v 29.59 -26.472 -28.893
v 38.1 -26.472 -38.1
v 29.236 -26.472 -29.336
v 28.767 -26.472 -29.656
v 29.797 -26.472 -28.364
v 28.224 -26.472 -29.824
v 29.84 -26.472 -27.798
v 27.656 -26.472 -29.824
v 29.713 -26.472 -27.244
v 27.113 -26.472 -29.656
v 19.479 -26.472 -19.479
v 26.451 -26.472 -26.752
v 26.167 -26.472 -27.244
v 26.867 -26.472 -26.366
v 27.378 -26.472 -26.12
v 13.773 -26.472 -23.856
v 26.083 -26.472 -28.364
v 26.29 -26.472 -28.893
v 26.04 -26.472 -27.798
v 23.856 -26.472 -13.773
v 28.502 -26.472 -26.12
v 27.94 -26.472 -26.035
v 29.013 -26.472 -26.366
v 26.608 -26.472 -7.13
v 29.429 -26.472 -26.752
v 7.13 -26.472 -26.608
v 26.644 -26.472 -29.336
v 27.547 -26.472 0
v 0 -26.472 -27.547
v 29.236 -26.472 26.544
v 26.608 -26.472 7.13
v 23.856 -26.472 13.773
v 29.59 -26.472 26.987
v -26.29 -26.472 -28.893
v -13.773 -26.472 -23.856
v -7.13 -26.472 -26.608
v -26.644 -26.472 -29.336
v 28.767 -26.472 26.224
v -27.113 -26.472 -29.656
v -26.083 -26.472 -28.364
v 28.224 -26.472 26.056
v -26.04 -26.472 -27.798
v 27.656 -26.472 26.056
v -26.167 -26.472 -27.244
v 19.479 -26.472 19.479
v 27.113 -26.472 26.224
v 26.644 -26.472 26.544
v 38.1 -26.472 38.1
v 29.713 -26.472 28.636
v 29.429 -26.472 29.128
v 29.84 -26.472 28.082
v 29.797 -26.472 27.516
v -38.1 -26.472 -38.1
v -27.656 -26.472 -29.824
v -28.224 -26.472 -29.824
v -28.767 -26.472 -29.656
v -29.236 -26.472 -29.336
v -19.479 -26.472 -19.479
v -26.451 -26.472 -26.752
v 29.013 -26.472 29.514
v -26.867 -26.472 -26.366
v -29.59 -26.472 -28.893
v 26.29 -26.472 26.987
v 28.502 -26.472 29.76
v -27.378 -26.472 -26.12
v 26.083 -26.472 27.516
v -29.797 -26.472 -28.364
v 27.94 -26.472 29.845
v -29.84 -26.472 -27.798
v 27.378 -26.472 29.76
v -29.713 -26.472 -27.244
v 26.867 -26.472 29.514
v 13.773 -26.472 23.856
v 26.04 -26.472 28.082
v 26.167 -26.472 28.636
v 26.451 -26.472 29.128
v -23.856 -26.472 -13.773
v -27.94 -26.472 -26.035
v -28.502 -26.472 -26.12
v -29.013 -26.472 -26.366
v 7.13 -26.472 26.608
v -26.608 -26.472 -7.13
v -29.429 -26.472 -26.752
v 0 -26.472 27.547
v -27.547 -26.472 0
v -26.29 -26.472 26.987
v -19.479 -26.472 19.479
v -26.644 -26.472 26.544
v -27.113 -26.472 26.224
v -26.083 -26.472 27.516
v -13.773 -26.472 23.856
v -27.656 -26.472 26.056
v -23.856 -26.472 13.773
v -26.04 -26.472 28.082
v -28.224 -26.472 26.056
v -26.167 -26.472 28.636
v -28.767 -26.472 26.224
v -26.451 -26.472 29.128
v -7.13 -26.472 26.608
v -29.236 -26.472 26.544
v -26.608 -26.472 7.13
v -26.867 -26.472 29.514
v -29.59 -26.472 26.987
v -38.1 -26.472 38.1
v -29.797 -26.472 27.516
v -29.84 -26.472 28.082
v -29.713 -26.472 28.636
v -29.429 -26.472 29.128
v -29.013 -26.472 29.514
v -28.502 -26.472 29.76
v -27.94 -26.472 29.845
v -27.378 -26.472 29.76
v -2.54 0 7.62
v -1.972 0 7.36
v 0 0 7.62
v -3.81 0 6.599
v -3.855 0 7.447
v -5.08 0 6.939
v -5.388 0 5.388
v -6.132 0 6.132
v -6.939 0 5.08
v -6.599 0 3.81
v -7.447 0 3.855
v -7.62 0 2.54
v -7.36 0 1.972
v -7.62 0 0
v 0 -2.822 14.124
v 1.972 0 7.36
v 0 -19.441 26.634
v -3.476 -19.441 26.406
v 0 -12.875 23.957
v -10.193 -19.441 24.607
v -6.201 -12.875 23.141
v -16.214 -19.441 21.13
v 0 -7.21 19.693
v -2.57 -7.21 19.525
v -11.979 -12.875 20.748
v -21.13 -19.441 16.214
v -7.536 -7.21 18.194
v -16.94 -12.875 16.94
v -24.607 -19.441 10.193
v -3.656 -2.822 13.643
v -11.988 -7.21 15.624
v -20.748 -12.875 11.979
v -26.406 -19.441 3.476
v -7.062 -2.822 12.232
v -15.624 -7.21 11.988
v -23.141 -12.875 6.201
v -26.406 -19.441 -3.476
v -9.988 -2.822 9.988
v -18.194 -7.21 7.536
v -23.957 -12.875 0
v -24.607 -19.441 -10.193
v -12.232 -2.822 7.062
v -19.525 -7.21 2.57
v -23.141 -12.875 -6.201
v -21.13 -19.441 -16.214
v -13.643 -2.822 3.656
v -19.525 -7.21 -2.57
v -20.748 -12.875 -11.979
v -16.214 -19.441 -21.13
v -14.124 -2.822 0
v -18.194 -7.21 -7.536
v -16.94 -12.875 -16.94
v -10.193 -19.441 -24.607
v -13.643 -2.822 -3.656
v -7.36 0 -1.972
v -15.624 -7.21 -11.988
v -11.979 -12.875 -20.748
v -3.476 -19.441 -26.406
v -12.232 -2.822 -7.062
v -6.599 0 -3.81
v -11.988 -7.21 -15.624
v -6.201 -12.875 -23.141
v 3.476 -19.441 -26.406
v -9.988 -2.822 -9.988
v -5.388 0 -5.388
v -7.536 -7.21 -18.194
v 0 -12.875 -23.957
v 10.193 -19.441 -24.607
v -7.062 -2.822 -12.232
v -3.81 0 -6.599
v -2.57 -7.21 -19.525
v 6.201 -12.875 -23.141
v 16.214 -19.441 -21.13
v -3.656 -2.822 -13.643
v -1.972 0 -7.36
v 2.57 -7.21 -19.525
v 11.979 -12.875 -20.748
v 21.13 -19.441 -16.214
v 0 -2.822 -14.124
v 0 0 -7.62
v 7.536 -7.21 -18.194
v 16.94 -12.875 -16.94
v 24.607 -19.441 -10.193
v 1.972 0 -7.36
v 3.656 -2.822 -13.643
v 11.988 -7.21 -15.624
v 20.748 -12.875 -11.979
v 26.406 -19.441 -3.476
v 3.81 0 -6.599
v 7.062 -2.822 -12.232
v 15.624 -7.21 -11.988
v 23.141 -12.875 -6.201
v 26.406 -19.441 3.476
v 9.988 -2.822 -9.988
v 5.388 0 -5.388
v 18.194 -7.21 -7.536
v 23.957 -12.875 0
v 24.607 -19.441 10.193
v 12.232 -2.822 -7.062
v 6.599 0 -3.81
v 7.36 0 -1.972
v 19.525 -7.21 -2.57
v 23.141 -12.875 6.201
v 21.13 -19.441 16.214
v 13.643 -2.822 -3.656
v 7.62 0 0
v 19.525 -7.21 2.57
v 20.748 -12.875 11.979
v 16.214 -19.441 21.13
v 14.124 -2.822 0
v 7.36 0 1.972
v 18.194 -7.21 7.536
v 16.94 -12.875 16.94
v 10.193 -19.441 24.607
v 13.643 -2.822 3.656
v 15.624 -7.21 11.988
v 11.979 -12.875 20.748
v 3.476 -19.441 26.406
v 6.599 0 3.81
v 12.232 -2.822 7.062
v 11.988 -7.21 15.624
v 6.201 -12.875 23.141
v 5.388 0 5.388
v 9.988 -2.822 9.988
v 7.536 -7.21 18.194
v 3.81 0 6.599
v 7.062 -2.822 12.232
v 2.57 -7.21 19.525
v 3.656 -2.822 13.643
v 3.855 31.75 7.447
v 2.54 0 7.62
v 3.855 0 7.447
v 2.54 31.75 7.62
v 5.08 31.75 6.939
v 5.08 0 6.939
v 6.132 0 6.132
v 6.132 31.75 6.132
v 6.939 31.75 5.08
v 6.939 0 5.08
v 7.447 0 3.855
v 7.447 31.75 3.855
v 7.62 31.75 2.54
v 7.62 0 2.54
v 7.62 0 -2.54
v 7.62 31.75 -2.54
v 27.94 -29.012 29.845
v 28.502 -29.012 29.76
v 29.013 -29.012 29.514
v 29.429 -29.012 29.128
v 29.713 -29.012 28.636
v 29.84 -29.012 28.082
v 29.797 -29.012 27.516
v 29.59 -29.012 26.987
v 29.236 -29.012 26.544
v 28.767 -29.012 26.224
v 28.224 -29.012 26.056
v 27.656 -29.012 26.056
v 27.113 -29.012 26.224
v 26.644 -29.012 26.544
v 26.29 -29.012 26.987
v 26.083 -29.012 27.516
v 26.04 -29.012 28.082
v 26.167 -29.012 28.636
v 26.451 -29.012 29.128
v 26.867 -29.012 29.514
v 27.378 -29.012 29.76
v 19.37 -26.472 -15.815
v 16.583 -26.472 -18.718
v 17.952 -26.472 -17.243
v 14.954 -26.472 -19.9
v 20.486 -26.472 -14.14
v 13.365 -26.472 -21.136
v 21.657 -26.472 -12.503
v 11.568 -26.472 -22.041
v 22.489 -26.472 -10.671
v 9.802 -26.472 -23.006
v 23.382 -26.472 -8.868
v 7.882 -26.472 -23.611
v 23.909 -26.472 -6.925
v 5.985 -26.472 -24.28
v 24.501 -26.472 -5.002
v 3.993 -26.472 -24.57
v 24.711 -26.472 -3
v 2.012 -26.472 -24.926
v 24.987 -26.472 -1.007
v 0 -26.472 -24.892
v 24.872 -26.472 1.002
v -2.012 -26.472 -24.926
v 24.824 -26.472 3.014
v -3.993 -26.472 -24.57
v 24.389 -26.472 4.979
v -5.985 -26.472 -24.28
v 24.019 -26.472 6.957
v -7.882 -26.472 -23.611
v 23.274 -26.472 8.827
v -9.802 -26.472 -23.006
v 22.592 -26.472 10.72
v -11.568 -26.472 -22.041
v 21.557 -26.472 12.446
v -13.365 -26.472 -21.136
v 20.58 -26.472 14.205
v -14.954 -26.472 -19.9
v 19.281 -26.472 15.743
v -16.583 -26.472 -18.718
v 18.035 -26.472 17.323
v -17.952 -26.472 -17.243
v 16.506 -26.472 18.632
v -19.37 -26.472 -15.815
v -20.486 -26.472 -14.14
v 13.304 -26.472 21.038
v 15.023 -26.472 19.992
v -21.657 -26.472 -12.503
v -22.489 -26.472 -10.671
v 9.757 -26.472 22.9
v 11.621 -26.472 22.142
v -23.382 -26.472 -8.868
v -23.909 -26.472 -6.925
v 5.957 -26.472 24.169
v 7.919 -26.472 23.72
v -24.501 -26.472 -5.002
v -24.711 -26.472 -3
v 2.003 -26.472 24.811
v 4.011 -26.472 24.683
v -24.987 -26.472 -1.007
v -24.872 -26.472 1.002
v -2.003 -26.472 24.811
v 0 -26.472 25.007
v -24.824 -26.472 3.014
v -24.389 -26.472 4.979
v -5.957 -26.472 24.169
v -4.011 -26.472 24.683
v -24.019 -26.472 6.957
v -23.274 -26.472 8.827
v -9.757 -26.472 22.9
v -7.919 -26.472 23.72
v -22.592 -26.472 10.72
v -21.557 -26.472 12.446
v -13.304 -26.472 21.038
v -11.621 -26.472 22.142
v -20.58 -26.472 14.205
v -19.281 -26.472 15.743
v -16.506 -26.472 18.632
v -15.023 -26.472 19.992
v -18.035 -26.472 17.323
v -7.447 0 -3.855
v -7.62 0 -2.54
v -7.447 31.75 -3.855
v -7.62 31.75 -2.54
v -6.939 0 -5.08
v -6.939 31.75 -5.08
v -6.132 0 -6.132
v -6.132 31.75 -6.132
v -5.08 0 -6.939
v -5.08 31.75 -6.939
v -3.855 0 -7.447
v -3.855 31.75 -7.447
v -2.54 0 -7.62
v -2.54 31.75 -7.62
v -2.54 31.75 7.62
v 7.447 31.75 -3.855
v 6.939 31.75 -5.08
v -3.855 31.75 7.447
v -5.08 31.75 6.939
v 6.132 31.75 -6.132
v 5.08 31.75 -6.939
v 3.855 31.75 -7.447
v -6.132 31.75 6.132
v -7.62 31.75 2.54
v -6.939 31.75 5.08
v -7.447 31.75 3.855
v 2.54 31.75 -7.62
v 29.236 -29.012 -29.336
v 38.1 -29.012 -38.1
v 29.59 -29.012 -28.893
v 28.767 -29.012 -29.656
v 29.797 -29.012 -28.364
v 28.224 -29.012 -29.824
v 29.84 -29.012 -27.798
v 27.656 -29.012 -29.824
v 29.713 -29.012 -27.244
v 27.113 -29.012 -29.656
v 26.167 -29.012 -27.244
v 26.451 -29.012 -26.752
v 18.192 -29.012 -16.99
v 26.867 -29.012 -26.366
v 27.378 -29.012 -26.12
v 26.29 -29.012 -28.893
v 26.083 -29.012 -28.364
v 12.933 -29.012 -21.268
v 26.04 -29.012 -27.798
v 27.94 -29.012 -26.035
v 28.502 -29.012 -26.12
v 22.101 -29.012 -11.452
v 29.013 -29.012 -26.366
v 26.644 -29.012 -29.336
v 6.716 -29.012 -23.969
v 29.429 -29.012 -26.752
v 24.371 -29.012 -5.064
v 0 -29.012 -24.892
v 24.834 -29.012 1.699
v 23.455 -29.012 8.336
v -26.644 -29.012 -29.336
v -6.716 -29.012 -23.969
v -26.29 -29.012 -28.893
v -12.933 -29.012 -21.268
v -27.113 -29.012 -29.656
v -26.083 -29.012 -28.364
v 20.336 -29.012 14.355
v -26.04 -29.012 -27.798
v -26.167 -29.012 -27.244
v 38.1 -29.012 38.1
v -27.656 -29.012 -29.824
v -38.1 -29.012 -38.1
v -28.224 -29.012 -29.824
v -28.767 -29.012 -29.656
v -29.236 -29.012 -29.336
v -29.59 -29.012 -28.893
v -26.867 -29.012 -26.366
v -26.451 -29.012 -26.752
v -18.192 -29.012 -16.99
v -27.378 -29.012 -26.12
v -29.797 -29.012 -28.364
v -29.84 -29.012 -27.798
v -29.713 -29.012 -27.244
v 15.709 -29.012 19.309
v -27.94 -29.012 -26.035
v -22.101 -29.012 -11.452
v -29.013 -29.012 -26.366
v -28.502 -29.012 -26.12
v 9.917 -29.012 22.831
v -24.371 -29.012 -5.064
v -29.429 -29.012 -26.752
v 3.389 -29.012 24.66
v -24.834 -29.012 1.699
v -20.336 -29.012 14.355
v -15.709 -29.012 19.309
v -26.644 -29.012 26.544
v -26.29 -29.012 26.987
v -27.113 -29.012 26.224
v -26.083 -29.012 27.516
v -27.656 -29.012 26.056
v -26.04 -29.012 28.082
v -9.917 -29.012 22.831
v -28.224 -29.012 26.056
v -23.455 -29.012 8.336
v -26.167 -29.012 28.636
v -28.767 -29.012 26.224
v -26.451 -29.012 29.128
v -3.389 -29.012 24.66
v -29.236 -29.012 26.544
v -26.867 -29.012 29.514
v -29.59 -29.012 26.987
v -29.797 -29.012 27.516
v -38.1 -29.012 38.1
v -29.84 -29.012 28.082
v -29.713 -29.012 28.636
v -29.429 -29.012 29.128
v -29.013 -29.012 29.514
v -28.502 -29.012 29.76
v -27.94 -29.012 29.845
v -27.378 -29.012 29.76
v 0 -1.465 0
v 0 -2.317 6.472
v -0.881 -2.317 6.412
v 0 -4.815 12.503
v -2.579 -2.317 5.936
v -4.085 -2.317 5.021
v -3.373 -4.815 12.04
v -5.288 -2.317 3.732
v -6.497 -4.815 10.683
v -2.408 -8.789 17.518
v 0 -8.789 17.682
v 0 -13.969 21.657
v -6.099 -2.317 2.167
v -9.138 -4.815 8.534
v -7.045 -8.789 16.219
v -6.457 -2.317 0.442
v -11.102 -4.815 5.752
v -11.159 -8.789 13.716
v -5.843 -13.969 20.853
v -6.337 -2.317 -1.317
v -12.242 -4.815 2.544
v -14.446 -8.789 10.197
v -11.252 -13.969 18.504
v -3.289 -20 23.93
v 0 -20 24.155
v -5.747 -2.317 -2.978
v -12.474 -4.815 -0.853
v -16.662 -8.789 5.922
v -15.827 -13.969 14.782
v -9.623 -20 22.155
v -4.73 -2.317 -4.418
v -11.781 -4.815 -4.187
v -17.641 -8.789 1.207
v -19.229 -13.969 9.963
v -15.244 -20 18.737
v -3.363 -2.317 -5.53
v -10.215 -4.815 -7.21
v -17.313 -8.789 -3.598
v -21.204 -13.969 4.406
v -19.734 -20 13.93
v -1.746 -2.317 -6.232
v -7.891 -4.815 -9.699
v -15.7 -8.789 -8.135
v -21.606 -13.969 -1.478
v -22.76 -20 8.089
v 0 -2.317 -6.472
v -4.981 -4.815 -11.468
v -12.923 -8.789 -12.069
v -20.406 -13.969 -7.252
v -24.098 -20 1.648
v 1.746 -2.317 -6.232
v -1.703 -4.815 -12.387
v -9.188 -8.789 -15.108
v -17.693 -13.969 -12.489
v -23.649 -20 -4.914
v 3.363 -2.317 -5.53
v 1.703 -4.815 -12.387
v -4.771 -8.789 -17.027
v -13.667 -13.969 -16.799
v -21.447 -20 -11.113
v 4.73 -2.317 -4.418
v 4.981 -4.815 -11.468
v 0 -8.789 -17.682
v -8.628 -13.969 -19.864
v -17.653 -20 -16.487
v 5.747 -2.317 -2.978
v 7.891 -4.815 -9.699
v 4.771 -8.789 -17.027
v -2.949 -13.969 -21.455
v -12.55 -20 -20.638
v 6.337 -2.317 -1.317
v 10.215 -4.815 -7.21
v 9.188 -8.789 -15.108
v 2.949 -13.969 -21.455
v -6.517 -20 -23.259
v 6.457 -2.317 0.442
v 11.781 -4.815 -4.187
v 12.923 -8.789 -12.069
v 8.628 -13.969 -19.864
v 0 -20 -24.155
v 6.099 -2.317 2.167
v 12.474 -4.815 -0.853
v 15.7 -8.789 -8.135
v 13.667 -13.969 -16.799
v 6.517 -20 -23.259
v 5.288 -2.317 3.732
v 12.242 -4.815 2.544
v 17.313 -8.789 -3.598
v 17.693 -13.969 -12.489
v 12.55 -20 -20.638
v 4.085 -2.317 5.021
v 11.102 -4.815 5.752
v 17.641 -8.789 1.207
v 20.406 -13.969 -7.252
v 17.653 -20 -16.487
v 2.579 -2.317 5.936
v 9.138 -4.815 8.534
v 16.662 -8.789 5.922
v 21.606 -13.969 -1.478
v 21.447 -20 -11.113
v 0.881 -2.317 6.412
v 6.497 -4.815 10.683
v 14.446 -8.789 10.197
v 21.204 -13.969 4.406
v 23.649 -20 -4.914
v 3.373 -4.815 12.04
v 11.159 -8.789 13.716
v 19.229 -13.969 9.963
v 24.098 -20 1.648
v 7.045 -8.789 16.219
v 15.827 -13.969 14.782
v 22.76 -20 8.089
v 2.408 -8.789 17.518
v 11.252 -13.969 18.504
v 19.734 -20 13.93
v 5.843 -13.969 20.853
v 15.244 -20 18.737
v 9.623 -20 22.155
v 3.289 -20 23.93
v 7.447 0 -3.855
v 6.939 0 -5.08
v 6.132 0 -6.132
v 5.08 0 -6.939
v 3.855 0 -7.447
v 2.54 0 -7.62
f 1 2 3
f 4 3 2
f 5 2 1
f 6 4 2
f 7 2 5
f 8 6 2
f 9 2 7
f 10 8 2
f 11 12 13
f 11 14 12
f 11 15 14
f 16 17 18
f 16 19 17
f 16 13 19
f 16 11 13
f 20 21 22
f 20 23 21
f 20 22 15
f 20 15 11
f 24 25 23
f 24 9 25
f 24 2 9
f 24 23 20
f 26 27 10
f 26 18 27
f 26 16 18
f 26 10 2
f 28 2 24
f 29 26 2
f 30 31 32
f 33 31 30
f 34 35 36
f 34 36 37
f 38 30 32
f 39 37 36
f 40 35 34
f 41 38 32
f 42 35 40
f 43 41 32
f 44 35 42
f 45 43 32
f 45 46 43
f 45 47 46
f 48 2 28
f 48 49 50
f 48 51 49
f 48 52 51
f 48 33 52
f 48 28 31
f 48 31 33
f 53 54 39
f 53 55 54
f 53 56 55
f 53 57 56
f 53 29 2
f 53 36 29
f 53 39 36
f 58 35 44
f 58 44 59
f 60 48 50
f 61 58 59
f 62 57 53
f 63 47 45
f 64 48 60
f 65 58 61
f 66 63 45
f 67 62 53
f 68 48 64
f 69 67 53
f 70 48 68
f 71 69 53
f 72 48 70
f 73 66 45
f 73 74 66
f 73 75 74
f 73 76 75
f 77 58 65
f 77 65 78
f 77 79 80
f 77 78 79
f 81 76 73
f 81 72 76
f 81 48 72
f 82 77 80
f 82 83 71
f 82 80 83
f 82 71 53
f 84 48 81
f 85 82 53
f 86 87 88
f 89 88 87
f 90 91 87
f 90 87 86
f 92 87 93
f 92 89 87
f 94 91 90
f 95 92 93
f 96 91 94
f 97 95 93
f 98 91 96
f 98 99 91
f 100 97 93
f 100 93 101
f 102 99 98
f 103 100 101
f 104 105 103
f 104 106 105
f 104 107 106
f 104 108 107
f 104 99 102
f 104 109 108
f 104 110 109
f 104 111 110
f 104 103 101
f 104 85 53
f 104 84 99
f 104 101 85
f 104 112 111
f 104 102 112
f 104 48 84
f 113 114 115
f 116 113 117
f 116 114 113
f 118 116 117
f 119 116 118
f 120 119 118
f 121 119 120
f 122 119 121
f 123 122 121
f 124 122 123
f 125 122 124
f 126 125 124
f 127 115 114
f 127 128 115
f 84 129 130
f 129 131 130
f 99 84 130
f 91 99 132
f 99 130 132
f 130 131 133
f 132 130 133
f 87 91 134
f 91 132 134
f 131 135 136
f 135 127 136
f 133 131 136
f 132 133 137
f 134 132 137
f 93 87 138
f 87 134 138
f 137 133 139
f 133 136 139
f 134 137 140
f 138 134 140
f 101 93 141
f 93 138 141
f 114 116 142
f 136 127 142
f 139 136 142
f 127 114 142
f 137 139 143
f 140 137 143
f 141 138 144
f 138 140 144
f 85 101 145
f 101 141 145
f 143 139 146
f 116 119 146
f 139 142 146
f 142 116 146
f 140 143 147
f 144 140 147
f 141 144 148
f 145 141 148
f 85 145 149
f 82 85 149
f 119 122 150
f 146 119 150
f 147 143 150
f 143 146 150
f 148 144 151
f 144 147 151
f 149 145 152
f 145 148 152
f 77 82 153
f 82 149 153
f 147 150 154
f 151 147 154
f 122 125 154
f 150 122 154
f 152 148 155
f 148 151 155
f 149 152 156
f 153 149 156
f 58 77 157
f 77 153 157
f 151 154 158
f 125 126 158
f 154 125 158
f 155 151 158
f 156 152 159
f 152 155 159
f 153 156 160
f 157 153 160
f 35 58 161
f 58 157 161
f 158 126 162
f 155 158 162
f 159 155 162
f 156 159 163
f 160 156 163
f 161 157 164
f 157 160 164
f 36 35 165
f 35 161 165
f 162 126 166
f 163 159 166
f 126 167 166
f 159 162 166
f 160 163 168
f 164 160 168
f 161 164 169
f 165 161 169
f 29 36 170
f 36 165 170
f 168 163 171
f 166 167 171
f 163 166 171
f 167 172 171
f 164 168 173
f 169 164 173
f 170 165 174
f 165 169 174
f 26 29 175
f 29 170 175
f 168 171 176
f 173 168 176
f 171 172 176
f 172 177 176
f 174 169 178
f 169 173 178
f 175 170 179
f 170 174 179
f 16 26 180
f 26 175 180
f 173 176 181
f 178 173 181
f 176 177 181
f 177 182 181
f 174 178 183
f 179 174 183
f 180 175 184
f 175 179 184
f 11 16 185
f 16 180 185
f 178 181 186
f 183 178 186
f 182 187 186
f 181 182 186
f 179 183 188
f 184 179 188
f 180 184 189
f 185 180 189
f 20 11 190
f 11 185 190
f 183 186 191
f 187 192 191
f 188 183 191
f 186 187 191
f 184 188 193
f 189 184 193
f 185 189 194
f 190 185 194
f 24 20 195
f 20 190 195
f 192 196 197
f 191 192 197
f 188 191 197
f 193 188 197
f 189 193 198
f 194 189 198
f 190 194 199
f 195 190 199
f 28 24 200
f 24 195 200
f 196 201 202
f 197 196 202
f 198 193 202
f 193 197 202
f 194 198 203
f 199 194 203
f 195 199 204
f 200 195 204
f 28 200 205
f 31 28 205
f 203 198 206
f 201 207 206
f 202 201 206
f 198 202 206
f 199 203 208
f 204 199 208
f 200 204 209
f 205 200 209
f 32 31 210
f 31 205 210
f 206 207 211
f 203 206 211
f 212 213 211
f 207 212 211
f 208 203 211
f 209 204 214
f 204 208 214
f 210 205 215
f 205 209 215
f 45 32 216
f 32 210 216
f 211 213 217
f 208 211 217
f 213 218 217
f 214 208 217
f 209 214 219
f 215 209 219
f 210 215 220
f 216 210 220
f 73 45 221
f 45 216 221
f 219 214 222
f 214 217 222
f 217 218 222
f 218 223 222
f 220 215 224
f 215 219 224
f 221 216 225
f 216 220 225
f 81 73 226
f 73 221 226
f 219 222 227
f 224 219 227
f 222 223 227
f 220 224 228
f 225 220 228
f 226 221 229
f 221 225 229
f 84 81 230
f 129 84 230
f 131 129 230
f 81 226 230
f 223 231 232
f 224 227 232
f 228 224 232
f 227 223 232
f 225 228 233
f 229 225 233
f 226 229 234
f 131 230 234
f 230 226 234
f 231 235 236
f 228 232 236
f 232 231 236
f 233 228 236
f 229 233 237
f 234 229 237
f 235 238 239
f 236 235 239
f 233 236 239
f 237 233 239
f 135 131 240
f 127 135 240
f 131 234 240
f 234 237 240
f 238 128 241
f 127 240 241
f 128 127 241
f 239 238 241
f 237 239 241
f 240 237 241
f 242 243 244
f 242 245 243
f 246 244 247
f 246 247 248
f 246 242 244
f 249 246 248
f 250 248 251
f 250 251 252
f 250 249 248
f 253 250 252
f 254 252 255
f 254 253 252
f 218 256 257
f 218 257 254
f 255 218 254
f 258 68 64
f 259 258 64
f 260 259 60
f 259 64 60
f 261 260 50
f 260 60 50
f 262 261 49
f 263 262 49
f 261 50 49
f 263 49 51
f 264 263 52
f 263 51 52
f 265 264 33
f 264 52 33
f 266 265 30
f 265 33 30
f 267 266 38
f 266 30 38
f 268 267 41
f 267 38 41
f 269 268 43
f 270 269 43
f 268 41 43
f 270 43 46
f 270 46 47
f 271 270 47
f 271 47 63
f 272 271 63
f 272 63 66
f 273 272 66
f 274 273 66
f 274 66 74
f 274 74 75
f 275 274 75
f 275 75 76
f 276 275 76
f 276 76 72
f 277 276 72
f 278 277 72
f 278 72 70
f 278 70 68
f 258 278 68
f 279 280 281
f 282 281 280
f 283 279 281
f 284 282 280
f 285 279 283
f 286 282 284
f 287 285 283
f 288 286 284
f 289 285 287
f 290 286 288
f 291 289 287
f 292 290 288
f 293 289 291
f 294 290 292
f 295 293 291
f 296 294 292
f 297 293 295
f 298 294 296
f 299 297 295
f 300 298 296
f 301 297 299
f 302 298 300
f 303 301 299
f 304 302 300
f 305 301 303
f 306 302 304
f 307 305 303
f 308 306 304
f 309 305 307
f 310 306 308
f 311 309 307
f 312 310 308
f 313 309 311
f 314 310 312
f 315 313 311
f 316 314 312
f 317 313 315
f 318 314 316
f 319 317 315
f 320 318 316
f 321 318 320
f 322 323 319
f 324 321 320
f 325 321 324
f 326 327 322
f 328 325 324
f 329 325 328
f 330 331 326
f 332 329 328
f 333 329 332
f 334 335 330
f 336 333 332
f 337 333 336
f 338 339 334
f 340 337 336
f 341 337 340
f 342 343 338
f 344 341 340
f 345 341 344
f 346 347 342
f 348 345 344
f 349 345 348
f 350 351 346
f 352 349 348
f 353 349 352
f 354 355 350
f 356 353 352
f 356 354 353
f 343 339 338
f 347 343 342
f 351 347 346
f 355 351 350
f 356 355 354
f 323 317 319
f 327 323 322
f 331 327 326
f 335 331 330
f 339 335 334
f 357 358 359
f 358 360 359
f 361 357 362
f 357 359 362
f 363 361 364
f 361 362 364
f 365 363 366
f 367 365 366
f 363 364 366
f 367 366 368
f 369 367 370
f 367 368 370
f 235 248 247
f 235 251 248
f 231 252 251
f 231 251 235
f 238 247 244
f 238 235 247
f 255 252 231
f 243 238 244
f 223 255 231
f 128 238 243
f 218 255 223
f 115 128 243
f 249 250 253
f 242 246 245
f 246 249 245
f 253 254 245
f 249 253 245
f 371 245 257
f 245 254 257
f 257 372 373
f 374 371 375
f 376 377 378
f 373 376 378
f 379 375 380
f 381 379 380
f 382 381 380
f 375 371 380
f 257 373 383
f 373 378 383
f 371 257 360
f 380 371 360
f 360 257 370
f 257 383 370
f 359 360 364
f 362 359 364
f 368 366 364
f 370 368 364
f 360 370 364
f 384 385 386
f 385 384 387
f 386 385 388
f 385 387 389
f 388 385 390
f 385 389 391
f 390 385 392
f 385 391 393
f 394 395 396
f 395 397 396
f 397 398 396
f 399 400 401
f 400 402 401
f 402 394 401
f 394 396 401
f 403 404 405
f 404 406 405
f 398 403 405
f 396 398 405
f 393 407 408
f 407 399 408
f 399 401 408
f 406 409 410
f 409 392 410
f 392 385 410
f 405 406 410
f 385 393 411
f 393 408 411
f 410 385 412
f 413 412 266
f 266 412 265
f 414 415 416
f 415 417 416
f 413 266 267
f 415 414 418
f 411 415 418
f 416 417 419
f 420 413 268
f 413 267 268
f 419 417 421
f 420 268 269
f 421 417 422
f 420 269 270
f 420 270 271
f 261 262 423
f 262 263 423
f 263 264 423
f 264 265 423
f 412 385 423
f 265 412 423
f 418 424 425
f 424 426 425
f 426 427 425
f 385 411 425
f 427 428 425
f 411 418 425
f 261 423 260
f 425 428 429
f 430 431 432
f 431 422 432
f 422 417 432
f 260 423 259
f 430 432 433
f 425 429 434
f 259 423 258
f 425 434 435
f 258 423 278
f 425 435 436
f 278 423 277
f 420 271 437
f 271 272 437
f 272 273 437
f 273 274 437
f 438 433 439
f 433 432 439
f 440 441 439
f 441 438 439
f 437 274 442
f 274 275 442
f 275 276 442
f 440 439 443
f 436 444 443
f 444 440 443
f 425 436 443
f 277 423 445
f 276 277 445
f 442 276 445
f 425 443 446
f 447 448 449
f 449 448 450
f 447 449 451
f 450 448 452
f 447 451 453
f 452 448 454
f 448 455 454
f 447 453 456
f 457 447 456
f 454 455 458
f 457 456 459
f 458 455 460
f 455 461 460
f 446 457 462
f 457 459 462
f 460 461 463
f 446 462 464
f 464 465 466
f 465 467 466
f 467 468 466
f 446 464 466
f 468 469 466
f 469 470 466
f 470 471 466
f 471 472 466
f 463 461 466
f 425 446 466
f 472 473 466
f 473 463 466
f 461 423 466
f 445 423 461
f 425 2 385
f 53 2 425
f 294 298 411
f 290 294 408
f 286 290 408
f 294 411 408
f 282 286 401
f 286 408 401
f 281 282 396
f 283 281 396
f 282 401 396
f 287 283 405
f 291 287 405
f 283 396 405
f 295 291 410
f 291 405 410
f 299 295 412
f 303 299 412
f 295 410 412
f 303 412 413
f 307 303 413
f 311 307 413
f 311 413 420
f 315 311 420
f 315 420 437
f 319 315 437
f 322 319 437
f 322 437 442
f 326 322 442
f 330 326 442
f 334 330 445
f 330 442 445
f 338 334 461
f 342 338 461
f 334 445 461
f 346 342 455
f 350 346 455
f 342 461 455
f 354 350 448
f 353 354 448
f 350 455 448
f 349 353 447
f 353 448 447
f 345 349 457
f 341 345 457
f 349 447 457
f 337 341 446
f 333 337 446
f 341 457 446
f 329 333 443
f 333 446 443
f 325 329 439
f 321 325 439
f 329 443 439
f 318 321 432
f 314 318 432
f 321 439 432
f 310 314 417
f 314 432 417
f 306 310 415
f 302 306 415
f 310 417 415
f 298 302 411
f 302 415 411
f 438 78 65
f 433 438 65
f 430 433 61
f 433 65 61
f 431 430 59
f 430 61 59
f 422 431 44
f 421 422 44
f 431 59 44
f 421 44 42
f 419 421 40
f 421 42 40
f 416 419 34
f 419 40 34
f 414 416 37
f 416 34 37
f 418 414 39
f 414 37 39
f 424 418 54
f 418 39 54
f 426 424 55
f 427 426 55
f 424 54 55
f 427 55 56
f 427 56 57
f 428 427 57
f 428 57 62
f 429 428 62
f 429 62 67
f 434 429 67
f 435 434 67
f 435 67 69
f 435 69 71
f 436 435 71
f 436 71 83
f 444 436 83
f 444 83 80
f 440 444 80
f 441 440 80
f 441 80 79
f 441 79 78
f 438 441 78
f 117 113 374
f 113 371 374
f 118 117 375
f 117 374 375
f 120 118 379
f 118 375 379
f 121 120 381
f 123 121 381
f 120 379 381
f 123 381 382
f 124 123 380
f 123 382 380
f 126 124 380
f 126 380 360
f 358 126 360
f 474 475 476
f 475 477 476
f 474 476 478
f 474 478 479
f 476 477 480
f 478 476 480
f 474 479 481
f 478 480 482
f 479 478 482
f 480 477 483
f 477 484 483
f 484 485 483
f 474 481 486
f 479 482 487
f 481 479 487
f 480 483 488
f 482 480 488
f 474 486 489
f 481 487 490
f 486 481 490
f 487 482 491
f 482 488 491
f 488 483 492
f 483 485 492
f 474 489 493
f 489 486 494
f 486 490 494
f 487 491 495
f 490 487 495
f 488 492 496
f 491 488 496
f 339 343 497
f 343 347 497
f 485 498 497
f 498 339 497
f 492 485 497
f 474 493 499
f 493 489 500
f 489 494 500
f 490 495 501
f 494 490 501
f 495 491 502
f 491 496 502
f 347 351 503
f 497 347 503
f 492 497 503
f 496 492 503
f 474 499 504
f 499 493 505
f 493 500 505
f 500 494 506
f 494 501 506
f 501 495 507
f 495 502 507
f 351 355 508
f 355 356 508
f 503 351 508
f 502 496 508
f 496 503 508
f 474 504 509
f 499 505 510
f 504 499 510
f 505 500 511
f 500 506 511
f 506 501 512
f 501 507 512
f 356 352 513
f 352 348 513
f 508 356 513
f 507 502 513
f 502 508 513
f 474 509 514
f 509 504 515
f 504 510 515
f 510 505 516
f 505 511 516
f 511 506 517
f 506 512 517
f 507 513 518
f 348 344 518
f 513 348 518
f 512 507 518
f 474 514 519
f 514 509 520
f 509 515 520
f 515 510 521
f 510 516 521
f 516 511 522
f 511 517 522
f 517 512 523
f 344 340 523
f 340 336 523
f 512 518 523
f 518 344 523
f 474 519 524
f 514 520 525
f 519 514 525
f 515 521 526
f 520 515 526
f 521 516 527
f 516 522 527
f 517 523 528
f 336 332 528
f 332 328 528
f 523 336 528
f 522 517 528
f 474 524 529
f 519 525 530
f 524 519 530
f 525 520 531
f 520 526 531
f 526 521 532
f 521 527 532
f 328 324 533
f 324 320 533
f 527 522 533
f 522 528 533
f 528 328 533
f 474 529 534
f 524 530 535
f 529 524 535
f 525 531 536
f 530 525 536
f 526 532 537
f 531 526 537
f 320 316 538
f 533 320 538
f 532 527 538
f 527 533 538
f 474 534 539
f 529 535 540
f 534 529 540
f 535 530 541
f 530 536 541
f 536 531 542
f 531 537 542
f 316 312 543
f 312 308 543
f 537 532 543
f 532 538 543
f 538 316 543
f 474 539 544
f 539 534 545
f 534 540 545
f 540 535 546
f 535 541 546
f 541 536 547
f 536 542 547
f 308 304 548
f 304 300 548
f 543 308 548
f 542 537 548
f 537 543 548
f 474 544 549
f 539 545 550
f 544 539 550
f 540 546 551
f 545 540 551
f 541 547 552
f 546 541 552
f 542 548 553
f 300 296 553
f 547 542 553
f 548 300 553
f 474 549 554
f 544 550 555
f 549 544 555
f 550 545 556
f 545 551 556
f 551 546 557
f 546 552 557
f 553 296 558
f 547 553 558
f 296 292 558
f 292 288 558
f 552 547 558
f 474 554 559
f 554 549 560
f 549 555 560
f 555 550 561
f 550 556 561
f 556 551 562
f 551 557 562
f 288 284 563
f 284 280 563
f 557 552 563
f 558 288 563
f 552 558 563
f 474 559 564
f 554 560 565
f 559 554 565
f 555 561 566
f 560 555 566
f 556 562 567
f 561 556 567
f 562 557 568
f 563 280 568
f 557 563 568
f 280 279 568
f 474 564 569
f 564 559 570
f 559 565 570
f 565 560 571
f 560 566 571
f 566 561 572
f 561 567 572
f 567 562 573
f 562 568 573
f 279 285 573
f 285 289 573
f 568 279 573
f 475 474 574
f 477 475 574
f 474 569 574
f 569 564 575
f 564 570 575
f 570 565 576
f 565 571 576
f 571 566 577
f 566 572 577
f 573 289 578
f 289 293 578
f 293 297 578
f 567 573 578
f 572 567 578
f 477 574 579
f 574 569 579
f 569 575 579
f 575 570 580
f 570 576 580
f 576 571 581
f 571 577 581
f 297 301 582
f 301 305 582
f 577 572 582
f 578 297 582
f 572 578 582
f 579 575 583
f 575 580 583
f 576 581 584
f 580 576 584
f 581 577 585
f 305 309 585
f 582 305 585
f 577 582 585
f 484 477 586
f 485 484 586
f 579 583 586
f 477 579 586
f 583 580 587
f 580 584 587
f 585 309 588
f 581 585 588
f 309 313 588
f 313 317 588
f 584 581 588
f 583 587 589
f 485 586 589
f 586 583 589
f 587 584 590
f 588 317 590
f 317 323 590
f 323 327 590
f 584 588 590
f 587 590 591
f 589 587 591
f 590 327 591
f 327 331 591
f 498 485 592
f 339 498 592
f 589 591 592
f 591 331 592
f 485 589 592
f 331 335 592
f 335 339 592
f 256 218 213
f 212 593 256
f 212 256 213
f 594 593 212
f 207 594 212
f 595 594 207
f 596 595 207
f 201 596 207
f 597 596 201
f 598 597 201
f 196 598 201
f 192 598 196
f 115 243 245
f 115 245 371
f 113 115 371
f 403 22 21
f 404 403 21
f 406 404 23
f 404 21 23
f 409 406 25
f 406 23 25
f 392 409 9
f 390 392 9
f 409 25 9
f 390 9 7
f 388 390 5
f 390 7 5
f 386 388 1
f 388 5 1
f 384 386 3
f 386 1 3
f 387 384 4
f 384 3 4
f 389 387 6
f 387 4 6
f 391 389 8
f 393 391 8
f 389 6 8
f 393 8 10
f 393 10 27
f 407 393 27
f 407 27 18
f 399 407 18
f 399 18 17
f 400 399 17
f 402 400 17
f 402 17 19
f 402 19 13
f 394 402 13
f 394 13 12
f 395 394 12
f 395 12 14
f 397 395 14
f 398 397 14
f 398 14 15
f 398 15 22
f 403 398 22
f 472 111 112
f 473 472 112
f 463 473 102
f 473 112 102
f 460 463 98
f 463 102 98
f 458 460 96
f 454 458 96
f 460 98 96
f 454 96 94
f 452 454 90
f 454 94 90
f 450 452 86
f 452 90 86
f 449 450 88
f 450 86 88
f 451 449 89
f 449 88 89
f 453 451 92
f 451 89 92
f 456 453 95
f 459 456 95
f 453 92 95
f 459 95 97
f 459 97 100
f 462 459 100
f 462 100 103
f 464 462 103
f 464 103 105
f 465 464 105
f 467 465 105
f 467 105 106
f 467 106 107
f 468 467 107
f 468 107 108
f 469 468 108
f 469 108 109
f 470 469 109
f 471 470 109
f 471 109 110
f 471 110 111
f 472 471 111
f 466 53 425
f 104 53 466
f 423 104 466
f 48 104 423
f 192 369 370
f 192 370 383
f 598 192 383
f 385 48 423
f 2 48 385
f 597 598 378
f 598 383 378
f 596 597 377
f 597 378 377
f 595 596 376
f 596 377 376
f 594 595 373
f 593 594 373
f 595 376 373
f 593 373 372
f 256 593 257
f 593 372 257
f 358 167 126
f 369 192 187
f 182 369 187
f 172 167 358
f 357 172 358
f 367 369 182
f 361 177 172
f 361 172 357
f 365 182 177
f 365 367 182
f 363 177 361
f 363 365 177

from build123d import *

# Parameters (mm, degrees)
BOSS_EXTRUDE1_DEPTH  = 31.75
FILLET1_R            = 5.08
BOSS_EXTRUDE2_DEPTH  = 2.5399999999999996
SKETCH5_R            = 24.891999999999996
CUT_EXTRUDE1_DEPTH   = 2.54
SKETCH6_R            = 1.905
CUT_EXTRUDE2_DEPTH   = 80.32849774232189
LPATTERN1_COUNT      = 2
LPATTERN1_PITCH      = 55.88
LPATTERN1_COUNT_DIR2 = 2
LPATTERN1_PITCH_DIR2 = 55.88


with BuildPart() as part:
    # Sketch1 → Boss-Extrude1 (new body)
    with BuildSketch(Plane(origin=(0, 0, 0), x_dir=(1, 0, 0), z_dir=(0, 1, 0))):
        Polygon((7.620000000000001, -7.619999999999999), (-7.619999999999997, -7.620000000000001), (-7.619999999999997, 7.619999999999997), (7.62, 7.619999999999999), align=None)
    extrude(amount=BOSS_EXTRUDE1_DEPTH)

    # Fillet1
    fillet1_edges = [part.edges().sort_by_distance(p)[0] for p in [
        (-7.619999999999997, 15.875, -7.619999999999997),
        (7.62, 15.875, -7.619999999999999),
        (7.620000000000001, 15.875, 7.619999999999999),
        (-7.619999999999997, 15.875, 7.620000000000001),
    ]]
    fillet(fillet1_edges, radius=FILLET1_R)

    # Sketch3 → Revolve1 (revolve)
    with BuildSketch(Plane(origin=(0, 0, 0), x_dir=(0, 0, -1), z_dir=(1, 0, 0)), mode=Mode.PRIVATE) as revolve1_sk:
        with BuildLine():
            Line((25.00680208994189, -26.471907853088844), (27.546802089941888, -26.471907853088844))
            ThreePointArc((27.546802089941888, -26.471907853088844), (19.47853055780167, -6.993377295287178), (0, 1.0748942368530439))
            Line((0, 1.0748942368530439), (0, -1.4651057631469566))
            ThreePointArc((0, -1.4651057631469566), (17.68247933358784, -8.789428519501008), (25.00680208994189, -26.471907853088844))
        make_face()
    revolve(revolve1_sk.sketch.rotate(Axis((0, -1.26539568401347, 0), (0, -1, 0)), 180), axis=Axis((0, -1.26539568401347, 0), (0, -1, 0)))

    # Sketch4 → Boss-Extrude2 (add)
    with BuildSketch(Plane.XZ.offset(26.471907853088844)):
        Polygon((38.10000000000001, -38.099999999999994), (-38.099999999999994, -38.10000000000001), (-38.099999999999994, 38.099999999999994), (38.10000000000001, 38.10000000000001), align=None)
    extrude(amount=BOSS_EXTRUDE2_DEPTH)

    # Sketch5 → Cut-Extrude1 (cut)
    with BuildSketch(Plane.XZ.offset(29.011907853088847)):
        with Locations(Location((0, 0, 0), (0, 0, 270))):
            Circle(SKETCH5_R)
    extrude(amount=-CUT_EXTRUDE1_DEPTH, mode=Mode.SUBTRACT)

    # Sketch6 → Cut-Extrude2 (cut, through all)
    with BuildSketch(Plane(origin=(0, -26.471907853088844, 0), x_dir=(1, 0, 0), z_dir=(0, 1, 0))):
        with Locations(Location((-27.939999999999998, 27.94000000000001, 0), (0, 0, 270))):
            Circle(SKETCH6_R)
    cut_extrude2 = extrude(amount=-CUT_EXTRUDE2_DEPTH, mode=Mode.SUBTRACT)

    # LPattern1: Cut-Extrude2 2 × 2
    with Locations(*[(i * LPATTERN1_PITCH, 0, j * LPATTERN1_PITCH_DIR2) for i in range(LPATTERN1_COUNT) for j in range(LPATTERN1_COUNT_DIR2) if (i, j) != (0, 0)]):
        add(cut_extrude2, mode=Mode.SUBTRACT)


solid = part.part
